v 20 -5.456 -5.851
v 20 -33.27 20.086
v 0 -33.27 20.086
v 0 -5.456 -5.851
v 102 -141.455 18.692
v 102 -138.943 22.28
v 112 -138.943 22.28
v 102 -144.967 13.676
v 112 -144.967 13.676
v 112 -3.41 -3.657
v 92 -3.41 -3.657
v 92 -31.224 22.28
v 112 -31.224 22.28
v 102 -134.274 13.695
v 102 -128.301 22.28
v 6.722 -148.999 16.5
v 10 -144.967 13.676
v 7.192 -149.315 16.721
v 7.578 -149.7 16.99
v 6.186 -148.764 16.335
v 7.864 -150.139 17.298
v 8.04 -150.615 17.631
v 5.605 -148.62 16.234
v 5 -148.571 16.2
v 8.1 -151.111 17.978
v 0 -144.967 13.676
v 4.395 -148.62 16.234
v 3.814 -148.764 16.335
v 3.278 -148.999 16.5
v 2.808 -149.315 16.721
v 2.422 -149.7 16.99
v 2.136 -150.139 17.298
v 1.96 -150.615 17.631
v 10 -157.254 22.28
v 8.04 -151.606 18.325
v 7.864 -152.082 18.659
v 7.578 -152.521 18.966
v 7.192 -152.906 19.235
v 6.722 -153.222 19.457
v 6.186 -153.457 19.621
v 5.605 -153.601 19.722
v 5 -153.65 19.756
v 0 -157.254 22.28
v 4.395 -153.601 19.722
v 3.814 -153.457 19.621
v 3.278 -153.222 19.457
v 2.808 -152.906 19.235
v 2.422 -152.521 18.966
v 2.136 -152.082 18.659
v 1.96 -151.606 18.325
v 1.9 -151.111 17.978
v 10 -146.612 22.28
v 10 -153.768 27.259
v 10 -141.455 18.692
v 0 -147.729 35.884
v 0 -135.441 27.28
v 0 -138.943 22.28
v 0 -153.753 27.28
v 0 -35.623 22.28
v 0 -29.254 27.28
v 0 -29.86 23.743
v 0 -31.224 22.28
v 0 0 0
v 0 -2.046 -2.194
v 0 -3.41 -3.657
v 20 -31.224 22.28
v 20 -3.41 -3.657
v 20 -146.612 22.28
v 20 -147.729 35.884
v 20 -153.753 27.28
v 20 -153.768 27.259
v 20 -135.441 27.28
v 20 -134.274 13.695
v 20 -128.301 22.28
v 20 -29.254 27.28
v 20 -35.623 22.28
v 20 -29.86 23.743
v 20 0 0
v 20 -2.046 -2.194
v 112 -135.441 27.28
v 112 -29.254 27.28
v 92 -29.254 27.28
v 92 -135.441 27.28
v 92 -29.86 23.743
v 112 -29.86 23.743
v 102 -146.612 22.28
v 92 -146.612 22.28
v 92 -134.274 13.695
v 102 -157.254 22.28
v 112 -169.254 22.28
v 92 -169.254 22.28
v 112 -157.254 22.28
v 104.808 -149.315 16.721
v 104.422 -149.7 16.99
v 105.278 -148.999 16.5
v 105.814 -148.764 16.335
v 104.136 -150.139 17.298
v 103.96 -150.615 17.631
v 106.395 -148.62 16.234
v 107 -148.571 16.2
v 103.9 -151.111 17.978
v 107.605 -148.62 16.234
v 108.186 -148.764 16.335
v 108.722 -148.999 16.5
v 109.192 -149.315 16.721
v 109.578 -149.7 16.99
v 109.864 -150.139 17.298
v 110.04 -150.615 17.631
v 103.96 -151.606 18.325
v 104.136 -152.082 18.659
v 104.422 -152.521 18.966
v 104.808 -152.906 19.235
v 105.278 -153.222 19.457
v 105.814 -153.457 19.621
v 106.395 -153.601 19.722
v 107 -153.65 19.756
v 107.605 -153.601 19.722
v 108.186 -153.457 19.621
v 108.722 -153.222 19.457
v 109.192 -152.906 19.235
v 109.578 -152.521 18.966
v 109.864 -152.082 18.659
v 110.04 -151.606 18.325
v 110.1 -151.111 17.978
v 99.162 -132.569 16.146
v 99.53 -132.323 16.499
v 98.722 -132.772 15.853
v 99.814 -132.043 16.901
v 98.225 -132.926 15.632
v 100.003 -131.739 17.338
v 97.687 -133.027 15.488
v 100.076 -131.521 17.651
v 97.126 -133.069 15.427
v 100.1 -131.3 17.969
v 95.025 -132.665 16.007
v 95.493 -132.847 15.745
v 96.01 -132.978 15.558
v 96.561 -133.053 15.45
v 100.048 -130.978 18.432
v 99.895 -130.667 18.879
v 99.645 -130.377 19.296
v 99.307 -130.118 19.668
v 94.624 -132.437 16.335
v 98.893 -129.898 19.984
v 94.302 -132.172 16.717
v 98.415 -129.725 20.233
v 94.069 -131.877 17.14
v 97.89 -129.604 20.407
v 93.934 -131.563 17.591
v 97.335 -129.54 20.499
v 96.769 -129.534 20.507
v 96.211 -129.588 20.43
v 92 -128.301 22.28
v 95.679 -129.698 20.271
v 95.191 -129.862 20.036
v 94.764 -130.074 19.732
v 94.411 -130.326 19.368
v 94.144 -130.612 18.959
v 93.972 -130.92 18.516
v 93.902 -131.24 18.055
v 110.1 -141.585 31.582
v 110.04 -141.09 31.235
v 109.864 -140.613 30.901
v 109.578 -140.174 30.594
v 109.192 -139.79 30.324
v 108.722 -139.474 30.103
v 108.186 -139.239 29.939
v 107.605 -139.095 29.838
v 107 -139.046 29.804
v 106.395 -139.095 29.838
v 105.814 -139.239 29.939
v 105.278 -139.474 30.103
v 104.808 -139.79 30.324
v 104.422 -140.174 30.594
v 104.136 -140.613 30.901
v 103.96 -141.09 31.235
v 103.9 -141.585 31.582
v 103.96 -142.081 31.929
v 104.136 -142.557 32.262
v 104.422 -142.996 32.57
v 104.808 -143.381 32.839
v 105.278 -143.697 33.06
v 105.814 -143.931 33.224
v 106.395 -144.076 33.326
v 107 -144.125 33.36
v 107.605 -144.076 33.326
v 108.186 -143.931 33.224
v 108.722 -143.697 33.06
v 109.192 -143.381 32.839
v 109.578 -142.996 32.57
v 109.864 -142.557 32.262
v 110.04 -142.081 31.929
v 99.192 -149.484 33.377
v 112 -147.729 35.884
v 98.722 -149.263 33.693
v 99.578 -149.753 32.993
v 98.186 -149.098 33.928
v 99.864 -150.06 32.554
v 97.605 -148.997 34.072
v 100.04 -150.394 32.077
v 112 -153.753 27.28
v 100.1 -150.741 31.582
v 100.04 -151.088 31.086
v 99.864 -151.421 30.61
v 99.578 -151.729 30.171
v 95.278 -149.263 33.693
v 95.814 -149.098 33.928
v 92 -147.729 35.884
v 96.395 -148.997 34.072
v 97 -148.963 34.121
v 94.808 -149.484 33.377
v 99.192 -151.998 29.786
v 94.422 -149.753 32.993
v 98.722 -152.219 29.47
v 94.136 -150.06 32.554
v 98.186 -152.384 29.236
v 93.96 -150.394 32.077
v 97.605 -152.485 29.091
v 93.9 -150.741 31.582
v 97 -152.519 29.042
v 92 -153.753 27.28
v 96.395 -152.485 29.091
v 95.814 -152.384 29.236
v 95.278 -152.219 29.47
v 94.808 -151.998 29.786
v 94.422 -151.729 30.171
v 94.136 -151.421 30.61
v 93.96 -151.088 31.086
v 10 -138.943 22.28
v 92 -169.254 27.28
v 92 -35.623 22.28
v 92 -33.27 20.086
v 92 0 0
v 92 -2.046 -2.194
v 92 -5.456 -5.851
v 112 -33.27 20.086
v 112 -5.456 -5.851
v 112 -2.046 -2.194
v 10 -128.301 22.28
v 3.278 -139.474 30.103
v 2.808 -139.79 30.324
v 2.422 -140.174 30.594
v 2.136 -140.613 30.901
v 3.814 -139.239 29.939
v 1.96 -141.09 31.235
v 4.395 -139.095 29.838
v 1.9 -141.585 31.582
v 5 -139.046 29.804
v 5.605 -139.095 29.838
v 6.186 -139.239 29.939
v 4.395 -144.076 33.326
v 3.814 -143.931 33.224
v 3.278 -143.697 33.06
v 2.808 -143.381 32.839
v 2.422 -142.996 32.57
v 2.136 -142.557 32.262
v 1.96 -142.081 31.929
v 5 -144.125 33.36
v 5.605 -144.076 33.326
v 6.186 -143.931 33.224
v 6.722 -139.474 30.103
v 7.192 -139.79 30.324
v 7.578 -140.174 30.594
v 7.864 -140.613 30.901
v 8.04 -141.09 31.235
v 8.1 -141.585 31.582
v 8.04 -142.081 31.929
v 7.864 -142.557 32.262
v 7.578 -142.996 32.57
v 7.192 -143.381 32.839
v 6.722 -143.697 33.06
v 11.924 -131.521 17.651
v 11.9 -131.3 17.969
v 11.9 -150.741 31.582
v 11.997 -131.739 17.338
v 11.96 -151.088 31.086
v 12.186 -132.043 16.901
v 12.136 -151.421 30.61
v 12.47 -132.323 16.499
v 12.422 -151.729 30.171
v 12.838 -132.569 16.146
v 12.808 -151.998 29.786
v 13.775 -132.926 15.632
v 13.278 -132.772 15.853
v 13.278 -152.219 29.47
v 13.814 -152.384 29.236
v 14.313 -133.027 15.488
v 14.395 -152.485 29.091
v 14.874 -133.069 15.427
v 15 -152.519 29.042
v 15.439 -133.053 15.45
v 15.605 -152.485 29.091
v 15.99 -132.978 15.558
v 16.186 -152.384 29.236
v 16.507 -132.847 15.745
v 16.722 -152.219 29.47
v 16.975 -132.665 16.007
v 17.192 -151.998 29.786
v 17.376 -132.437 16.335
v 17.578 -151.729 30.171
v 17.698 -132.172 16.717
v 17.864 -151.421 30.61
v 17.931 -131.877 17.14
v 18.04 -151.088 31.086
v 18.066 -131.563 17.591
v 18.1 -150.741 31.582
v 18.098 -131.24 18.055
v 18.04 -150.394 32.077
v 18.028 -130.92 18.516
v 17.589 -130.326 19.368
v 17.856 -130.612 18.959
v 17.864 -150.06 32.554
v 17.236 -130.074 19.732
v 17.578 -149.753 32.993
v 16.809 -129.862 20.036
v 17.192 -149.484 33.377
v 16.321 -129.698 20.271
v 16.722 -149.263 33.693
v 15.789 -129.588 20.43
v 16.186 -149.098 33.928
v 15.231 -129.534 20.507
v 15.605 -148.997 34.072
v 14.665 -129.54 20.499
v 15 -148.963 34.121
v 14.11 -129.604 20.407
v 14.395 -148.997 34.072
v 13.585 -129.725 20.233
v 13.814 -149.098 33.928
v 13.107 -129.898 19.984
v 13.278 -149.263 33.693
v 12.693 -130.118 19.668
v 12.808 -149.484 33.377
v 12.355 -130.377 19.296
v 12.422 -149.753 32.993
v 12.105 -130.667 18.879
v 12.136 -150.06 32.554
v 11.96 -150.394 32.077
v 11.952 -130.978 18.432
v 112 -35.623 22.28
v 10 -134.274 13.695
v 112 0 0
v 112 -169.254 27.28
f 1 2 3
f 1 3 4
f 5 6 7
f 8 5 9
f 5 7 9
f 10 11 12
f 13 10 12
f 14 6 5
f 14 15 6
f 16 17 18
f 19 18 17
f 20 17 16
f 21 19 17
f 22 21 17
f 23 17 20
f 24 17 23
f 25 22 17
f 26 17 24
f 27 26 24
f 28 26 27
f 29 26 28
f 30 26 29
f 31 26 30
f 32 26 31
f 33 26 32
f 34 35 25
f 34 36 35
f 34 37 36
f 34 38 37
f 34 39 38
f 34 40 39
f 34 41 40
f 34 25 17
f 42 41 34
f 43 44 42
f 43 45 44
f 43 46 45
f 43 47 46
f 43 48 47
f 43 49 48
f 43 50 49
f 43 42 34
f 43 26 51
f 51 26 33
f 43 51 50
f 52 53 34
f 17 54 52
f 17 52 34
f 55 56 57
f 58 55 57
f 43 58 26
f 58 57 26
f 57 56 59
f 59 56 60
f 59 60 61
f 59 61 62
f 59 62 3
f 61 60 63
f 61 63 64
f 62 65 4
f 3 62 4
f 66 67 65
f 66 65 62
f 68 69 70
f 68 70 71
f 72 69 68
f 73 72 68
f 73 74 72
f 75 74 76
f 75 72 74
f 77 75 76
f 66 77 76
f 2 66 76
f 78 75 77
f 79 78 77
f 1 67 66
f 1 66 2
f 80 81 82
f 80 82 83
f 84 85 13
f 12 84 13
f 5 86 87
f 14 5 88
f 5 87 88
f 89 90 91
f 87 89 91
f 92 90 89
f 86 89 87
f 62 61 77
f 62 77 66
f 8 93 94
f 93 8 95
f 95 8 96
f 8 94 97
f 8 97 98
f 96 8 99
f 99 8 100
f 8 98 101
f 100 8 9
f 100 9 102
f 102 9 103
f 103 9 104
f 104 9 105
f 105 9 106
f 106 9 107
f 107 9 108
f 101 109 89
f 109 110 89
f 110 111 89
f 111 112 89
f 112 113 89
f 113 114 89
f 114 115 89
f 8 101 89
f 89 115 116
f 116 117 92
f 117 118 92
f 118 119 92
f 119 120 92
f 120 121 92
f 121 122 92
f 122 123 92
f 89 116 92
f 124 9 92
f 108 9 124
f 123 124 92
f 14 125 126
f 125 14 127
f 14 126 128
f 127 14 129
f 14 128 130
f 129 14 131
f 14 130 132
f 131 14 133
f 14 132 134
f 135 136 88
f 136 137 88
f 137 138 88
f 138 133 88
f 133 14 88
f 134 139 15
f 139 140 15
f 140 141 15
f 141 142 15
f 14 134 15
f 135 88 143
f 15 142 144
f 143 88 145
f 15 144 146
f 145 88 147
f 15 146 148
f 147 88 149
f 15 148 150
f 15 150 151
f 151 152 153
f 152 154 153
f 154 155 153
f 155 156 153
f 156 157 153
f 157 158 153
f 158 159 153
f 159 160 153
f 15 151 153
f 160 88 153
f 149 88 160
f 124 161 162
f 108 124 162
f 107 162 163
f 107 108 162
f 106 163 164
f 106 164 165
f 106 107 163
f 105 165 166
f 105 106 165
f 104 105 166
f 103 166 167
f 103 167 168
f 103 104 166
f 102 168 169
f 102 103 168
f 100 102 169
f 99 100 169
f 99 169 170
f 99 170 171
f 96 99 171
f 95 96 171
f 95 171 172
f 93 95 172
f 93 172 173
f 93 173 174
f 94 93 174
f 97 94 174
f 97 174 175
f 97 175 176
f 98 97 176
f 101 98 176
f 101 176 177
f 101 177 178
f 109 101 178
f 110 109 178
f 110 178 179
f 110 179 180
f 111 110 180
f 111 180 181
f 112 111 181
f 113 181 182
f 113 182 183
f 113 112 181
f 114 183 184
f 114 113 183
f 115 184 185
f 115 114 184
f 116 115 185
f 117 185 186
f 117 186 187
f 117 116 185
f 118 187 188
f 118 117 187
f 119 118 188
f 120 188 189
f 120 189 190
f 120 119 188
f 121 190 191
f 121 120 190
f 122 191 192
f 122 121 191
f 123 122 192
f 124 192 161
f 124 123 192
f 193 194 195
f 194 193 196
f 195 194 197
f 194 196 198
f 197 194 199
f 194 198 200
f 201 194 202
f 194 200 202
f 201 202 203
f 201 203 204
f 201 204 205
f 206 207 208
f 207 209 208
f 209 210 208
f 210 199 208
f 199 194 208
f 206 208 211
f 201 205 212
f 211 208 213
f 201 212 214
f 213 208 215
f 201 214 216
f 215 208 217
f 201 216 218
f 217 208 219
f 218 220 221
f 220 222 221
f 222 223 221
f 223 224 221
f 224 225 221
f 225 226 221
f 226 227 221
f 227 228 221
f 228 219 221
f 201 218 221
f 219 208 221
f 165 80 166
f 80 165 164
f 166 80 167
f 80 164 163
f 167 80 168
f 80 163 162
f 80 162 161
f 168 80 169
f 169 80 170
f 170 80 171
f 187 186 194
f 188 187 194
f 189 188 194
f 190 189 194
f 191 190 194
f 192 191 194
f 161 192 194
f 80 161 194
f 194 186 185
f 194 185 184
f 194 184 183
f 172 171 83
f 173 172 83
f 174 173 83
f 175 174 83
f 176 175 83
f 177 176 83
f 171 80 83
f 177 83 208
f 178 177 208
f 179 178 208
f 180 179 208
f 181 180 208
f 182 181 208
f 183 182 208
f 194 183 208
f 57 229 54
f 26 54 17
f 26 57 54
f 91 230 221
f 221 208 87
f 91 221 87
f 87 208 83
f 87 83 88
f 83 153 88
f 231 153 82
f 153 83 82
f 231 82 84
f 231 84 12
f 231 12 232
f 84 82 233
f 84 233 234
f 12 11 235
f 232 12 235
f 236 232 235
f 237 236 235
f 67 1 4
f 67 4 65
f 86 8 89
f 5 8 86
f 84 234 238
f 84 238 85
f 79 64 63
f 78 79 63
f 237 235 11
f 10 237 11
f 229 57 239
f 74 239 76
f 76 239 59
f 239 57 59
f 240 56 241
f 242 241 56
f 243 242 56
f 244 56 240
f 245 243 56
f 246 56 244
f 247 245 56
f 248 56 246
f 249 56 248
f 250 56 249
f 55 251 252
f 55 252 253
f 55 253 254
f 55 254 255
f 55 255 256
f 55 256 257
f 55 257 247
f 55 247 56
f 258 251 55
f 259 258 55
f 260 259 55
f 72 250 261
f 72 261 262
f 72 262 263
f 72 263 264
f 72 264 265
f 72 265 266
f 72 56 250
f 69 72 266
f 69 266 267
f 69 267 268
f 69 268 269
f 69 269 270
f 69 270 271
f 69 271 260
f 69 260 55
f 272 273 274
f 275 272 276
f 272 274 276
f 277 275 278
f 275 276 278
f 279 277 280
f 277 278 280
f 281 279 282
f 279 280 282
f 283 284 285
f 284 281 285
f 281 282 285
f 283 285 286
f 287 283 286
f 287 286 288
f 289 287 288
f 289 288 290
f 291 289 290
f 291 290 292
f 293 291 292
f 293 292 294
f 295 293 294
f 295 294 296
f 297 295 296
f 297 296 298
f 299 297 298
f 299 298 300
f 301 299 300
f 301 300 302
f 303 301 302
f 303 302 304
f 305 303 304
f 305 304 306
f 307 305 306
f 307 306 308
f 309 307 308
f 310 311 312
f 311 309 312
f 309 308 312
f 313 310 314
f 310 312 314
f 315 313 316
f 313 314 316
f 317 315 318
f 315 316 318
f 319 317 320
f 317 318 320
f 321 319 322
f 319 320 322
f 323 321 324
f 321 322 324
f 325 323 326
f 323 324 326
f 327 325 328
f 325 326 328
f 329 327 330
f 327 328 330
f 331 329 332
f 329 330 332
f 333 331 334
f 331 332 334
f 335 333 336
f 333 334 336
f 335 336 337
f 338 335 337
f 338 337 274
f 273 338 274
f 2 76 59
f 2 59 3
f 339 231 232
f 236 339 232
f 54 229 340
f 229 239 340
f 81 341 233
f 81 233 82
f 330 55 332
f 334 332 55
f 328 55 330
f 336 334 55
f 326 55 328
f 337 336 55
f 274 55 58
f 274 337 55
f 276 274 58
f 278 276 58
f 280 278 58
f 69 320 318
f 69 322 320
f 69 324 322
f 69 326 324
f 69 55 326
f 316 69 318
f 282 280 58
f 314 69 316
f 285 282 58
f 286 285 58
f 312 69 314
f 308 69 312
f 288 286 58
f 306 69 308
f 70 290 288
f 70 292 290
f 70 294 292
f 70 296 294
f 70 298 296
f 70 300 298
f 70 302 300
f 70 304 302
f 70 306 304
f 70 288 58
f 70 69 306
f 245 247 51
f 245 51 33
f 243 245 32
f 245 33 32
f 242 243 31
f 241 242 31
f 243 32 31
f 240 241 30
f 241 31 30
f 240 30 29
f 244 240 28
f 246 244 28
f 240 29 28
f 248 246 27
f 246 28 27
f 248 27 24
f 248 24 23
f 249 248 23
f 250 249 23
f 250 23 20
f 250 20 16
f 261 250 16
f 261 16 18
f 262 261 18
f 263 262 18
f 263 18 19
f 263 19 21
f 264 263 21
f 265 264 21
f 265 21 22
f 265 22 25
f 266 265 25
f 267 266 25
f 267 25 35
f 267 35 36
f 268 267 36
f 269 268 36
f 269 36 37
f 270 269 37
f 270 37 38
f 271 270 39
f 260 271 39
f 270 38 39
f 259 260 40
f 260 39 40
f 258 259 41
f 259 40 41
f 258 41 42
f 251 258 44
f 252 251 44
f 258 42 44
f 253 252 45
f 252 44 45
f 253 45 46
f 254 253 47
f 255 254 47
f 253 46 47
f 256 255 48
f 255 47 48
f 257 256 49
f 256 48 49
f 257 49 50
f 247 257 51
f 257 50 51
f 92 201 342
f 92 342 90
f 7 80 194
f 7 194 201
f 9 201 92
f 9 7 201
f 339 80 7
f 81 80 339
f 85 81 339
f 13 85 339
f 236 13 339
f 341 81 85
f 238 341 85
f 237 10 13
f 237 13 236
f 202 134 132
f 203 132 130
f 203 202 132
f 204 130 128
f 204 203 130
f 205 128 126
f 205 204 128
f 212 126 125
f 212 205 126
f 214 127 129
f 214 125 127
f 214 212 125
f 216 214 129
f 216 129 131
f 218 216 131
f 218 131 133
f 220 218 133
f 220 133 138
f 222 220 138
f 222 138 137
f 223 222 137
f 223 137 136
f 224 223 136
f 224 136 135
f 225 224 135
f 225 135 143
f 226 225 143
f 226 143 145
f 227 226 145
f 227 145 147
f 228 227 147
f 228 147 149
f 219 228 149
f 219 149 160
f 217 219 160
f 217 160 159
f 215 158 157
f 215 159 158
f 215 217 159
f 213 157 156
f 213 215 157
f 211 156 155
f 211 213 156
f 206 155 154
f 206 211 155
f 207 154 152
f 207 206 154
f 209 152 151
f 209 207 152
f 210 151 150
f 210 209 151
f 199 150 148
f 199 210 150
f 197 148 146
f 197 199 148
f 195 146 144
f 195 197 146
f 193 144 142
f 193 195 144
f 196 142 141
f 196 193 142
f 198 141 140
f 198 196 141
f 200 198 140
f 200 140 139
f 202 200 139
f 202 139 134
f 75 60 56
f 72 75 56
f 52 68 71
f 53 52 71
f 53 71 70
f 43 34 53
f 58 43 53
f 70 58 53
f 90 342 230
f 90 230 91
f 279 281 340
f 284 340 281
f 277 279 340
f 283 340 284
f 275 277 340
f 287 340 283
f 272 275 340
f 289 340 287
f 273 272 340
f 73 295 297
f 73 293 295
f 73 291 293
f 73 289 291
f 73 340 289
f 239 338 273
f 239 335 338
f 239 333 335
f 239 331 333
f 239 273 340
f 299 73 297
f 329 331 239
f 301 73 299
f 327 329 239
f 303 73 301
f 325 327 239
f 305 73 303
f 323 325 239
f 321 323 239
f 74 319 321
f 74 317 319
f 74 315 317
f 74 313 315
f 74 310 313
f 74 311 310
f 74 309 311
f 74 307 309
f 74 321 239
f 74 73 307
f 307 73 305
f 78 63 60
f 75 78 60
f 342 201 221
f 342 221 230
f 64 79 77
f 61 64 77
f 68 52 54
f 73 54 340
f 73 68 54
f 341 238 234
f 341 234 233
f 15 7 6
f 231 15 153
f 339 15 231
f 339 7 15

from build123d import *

# Parameters (mm, degrees)
BOSS_EXTRUDE1_DEPTH     = 20
CUT_EXTRUDE1_DEPTH      = 1
CUT_EXTRUDE1_DEPTH_BACK = 21
BOSS_EXTRUDE2_DEPTH     = 20
BOSS_EXTRUDE4_DEPTH     = 10
SKETCH7_R               = 3.1
CUT_EXTRUDE3_DEPTH      = 102.340728726
BOSS_EXTRUDE5_DEPTH     = 10
SKETCH9_R               = 3.1
CUT_EXTRUDE4_DEPTH      = 145.950200236
CUT_EXTRUDE6_DEPTH      = 20
CUT_EXTRUDE7_DEPTH      = 10


with BuildPart() as part:
    # Sketch1 → Boss-Extrude1 (new body)
    with BuildSketch(Plane(origin=(0, 0, 0), x_dir=(0, 0, -1), z_dir=(1, 0, 0))):
        Polygon((0, 0), (-27.279934402, -29.254148065), (-27.279934402, -169.254148065), (-22.279934402, -169.254148065), (-22.279934402, -31.223700443), (3.656768508, -3.4099918), align=None)
    extrude(amount=BOSS_EXTRUDE1_DEPTH)

    # Sketch2 → Cut-Extrude1 (cut, two sides)
    with BuildSketch(Plane(origin=(20, 0, 0), x_dir=(0, 0, -1), z_dir=(1, 0, 0))) as cut_extrude1_sk:
        Polygon((2.194061105, -2.04599508), (-23.742641806, -29.859703723), (-22.279934402, -31.223700443), (3.656768508, -3.4099918), align=None)
    extrude(amount=CUT_EXTRUDE1_DEPTH, mode=Mode.SUBTRACT)
    extrude(cut_extrude1_sk.sketch, amount=-CUT_EXTRUDE1_DEPTH_BACK, mode=Mode.SUBTRACT)

    # Sketch3 → Boss-Extrude2 (add)
    with BuildSketch(Plane(origin=(20, 0, 0), x_dir=(0, 0, -1), z_dir=(1, 0, 0))):
        Polygon((3.656768508, -3.4099918), (-22.279934402, -31.223700443), (-20.085873298, -33.269695523), (5.850829613, -5.45598688), align=None)
        Polygon((-22.279934402, -35.622538), (-20.085873298, -33.269695523), (-22.279934402, -31.223700443), align=None)
    extrude(amount=-BOSS_EXTRUDE2_DEPTH)

    # Sketch6 → Boss-Extrude4 (add)
    with BuildSketch(Plane.ZY):
        Polygon((27.279934402, -135.441491542), (27.279934402, -153.753110374), (35.883580948, -147.728772207), align=None)
        Polygon((22.279934402, -138.942529233), (13.676287857, -144.9668674), (22.279934402, -157.254148065), align=None)
    extrude(amount=-BOSS_EXTRUDE4_DEPTH)

    # Sketch7 → Cut-Extrude3 (cut, through all)
    with BuildSketch(Plane(origin=(0, -41.266885928, -58.935220882), x_dir=(-1, 0, 0), z_dir=(0, -0.573576436, -0.819152044))):
        with Locations((-5, -134.094302237)):
            Circle(SKETCH7_R)
    extrude(amount=-CUT_EXTRUDE3_DEPTH, mode=Mode.SUBTRACT)

    # Sketch8 → Boss-Extrude5 (add)
    with BuildSketch(Plane(origin=(20, 0, 0), x_dir=(0, 0, -1), z_dir=(1, 0, 0))):
        Polygon((-27.279934402, -135.441491542), (-27.279934402, -153.753110374), (-22.279934402, -146.61237034), (-13.695141582, -134.273766824), (-22.279934402, -128.300751509), align=None)
        Polygon((-35.883580948, -147.728772207), (-27.279934402, -153.753110374), (-27.279934402, -135.441491542), align=None)
    extrude(amount=-BOSS_EXTRUDE5_DEPTH)

    # Sketch9 → Cut-Extrude4 (cut, through all)
    with BuildSketch(Plane(origin=(0, -115.987262137, 81.215155285), x_dir=(-1, 0, 0), z_dir=(0, -0.819152044, 0.573576436))):
        with Locations((-15, 60.591190556)):
            Circle(SKETCH9_R)
    extrude(amount=-CUT_EXTRUDE4_DEPTH, mode=Mode.SUBTRACT)


with BuildPart() as body_2:
    # Mirror2: mirrored copy
    add(part.part.mirror(Plane(origin=(56, 0, 0), x_dir=(0, 0, 1), z_dir=(1, 0, 0))))


with BuildPart() as part_1:
    add(part.part)

    # Sketch11 → Cut-Extrude6 (cut)
    with BuildSketch(Plane.ZY):
        Polygon((22.279934402, -157.254148065), (27.279934402, -153.753110374), (27.279934402, -169.254148065), (22.279934402, -169.254148065), align=None)
    extrude(amount=-CUT_EXTRUDE6_DEPTH, mode=Mode.SUBTRACT)

    # Sketch12 → Cut-Extrude7 (cut)
    with BuildSketch(Plane(origin=(20, 0, 0), x_dir=(0, 0, -1), z_dir=(1, 0, 0))):
        Polygon((-22.279934402, -157.254148065), (-22.279934402, -146.61237034), (-27.258612912, -153.768039842), align=None)
    extrude(amount=-CUT_EXTRUDE7_DEPTH, mode=Mode.SUBTRACT)


solid = Compound([body_2.part, part_1.part])
